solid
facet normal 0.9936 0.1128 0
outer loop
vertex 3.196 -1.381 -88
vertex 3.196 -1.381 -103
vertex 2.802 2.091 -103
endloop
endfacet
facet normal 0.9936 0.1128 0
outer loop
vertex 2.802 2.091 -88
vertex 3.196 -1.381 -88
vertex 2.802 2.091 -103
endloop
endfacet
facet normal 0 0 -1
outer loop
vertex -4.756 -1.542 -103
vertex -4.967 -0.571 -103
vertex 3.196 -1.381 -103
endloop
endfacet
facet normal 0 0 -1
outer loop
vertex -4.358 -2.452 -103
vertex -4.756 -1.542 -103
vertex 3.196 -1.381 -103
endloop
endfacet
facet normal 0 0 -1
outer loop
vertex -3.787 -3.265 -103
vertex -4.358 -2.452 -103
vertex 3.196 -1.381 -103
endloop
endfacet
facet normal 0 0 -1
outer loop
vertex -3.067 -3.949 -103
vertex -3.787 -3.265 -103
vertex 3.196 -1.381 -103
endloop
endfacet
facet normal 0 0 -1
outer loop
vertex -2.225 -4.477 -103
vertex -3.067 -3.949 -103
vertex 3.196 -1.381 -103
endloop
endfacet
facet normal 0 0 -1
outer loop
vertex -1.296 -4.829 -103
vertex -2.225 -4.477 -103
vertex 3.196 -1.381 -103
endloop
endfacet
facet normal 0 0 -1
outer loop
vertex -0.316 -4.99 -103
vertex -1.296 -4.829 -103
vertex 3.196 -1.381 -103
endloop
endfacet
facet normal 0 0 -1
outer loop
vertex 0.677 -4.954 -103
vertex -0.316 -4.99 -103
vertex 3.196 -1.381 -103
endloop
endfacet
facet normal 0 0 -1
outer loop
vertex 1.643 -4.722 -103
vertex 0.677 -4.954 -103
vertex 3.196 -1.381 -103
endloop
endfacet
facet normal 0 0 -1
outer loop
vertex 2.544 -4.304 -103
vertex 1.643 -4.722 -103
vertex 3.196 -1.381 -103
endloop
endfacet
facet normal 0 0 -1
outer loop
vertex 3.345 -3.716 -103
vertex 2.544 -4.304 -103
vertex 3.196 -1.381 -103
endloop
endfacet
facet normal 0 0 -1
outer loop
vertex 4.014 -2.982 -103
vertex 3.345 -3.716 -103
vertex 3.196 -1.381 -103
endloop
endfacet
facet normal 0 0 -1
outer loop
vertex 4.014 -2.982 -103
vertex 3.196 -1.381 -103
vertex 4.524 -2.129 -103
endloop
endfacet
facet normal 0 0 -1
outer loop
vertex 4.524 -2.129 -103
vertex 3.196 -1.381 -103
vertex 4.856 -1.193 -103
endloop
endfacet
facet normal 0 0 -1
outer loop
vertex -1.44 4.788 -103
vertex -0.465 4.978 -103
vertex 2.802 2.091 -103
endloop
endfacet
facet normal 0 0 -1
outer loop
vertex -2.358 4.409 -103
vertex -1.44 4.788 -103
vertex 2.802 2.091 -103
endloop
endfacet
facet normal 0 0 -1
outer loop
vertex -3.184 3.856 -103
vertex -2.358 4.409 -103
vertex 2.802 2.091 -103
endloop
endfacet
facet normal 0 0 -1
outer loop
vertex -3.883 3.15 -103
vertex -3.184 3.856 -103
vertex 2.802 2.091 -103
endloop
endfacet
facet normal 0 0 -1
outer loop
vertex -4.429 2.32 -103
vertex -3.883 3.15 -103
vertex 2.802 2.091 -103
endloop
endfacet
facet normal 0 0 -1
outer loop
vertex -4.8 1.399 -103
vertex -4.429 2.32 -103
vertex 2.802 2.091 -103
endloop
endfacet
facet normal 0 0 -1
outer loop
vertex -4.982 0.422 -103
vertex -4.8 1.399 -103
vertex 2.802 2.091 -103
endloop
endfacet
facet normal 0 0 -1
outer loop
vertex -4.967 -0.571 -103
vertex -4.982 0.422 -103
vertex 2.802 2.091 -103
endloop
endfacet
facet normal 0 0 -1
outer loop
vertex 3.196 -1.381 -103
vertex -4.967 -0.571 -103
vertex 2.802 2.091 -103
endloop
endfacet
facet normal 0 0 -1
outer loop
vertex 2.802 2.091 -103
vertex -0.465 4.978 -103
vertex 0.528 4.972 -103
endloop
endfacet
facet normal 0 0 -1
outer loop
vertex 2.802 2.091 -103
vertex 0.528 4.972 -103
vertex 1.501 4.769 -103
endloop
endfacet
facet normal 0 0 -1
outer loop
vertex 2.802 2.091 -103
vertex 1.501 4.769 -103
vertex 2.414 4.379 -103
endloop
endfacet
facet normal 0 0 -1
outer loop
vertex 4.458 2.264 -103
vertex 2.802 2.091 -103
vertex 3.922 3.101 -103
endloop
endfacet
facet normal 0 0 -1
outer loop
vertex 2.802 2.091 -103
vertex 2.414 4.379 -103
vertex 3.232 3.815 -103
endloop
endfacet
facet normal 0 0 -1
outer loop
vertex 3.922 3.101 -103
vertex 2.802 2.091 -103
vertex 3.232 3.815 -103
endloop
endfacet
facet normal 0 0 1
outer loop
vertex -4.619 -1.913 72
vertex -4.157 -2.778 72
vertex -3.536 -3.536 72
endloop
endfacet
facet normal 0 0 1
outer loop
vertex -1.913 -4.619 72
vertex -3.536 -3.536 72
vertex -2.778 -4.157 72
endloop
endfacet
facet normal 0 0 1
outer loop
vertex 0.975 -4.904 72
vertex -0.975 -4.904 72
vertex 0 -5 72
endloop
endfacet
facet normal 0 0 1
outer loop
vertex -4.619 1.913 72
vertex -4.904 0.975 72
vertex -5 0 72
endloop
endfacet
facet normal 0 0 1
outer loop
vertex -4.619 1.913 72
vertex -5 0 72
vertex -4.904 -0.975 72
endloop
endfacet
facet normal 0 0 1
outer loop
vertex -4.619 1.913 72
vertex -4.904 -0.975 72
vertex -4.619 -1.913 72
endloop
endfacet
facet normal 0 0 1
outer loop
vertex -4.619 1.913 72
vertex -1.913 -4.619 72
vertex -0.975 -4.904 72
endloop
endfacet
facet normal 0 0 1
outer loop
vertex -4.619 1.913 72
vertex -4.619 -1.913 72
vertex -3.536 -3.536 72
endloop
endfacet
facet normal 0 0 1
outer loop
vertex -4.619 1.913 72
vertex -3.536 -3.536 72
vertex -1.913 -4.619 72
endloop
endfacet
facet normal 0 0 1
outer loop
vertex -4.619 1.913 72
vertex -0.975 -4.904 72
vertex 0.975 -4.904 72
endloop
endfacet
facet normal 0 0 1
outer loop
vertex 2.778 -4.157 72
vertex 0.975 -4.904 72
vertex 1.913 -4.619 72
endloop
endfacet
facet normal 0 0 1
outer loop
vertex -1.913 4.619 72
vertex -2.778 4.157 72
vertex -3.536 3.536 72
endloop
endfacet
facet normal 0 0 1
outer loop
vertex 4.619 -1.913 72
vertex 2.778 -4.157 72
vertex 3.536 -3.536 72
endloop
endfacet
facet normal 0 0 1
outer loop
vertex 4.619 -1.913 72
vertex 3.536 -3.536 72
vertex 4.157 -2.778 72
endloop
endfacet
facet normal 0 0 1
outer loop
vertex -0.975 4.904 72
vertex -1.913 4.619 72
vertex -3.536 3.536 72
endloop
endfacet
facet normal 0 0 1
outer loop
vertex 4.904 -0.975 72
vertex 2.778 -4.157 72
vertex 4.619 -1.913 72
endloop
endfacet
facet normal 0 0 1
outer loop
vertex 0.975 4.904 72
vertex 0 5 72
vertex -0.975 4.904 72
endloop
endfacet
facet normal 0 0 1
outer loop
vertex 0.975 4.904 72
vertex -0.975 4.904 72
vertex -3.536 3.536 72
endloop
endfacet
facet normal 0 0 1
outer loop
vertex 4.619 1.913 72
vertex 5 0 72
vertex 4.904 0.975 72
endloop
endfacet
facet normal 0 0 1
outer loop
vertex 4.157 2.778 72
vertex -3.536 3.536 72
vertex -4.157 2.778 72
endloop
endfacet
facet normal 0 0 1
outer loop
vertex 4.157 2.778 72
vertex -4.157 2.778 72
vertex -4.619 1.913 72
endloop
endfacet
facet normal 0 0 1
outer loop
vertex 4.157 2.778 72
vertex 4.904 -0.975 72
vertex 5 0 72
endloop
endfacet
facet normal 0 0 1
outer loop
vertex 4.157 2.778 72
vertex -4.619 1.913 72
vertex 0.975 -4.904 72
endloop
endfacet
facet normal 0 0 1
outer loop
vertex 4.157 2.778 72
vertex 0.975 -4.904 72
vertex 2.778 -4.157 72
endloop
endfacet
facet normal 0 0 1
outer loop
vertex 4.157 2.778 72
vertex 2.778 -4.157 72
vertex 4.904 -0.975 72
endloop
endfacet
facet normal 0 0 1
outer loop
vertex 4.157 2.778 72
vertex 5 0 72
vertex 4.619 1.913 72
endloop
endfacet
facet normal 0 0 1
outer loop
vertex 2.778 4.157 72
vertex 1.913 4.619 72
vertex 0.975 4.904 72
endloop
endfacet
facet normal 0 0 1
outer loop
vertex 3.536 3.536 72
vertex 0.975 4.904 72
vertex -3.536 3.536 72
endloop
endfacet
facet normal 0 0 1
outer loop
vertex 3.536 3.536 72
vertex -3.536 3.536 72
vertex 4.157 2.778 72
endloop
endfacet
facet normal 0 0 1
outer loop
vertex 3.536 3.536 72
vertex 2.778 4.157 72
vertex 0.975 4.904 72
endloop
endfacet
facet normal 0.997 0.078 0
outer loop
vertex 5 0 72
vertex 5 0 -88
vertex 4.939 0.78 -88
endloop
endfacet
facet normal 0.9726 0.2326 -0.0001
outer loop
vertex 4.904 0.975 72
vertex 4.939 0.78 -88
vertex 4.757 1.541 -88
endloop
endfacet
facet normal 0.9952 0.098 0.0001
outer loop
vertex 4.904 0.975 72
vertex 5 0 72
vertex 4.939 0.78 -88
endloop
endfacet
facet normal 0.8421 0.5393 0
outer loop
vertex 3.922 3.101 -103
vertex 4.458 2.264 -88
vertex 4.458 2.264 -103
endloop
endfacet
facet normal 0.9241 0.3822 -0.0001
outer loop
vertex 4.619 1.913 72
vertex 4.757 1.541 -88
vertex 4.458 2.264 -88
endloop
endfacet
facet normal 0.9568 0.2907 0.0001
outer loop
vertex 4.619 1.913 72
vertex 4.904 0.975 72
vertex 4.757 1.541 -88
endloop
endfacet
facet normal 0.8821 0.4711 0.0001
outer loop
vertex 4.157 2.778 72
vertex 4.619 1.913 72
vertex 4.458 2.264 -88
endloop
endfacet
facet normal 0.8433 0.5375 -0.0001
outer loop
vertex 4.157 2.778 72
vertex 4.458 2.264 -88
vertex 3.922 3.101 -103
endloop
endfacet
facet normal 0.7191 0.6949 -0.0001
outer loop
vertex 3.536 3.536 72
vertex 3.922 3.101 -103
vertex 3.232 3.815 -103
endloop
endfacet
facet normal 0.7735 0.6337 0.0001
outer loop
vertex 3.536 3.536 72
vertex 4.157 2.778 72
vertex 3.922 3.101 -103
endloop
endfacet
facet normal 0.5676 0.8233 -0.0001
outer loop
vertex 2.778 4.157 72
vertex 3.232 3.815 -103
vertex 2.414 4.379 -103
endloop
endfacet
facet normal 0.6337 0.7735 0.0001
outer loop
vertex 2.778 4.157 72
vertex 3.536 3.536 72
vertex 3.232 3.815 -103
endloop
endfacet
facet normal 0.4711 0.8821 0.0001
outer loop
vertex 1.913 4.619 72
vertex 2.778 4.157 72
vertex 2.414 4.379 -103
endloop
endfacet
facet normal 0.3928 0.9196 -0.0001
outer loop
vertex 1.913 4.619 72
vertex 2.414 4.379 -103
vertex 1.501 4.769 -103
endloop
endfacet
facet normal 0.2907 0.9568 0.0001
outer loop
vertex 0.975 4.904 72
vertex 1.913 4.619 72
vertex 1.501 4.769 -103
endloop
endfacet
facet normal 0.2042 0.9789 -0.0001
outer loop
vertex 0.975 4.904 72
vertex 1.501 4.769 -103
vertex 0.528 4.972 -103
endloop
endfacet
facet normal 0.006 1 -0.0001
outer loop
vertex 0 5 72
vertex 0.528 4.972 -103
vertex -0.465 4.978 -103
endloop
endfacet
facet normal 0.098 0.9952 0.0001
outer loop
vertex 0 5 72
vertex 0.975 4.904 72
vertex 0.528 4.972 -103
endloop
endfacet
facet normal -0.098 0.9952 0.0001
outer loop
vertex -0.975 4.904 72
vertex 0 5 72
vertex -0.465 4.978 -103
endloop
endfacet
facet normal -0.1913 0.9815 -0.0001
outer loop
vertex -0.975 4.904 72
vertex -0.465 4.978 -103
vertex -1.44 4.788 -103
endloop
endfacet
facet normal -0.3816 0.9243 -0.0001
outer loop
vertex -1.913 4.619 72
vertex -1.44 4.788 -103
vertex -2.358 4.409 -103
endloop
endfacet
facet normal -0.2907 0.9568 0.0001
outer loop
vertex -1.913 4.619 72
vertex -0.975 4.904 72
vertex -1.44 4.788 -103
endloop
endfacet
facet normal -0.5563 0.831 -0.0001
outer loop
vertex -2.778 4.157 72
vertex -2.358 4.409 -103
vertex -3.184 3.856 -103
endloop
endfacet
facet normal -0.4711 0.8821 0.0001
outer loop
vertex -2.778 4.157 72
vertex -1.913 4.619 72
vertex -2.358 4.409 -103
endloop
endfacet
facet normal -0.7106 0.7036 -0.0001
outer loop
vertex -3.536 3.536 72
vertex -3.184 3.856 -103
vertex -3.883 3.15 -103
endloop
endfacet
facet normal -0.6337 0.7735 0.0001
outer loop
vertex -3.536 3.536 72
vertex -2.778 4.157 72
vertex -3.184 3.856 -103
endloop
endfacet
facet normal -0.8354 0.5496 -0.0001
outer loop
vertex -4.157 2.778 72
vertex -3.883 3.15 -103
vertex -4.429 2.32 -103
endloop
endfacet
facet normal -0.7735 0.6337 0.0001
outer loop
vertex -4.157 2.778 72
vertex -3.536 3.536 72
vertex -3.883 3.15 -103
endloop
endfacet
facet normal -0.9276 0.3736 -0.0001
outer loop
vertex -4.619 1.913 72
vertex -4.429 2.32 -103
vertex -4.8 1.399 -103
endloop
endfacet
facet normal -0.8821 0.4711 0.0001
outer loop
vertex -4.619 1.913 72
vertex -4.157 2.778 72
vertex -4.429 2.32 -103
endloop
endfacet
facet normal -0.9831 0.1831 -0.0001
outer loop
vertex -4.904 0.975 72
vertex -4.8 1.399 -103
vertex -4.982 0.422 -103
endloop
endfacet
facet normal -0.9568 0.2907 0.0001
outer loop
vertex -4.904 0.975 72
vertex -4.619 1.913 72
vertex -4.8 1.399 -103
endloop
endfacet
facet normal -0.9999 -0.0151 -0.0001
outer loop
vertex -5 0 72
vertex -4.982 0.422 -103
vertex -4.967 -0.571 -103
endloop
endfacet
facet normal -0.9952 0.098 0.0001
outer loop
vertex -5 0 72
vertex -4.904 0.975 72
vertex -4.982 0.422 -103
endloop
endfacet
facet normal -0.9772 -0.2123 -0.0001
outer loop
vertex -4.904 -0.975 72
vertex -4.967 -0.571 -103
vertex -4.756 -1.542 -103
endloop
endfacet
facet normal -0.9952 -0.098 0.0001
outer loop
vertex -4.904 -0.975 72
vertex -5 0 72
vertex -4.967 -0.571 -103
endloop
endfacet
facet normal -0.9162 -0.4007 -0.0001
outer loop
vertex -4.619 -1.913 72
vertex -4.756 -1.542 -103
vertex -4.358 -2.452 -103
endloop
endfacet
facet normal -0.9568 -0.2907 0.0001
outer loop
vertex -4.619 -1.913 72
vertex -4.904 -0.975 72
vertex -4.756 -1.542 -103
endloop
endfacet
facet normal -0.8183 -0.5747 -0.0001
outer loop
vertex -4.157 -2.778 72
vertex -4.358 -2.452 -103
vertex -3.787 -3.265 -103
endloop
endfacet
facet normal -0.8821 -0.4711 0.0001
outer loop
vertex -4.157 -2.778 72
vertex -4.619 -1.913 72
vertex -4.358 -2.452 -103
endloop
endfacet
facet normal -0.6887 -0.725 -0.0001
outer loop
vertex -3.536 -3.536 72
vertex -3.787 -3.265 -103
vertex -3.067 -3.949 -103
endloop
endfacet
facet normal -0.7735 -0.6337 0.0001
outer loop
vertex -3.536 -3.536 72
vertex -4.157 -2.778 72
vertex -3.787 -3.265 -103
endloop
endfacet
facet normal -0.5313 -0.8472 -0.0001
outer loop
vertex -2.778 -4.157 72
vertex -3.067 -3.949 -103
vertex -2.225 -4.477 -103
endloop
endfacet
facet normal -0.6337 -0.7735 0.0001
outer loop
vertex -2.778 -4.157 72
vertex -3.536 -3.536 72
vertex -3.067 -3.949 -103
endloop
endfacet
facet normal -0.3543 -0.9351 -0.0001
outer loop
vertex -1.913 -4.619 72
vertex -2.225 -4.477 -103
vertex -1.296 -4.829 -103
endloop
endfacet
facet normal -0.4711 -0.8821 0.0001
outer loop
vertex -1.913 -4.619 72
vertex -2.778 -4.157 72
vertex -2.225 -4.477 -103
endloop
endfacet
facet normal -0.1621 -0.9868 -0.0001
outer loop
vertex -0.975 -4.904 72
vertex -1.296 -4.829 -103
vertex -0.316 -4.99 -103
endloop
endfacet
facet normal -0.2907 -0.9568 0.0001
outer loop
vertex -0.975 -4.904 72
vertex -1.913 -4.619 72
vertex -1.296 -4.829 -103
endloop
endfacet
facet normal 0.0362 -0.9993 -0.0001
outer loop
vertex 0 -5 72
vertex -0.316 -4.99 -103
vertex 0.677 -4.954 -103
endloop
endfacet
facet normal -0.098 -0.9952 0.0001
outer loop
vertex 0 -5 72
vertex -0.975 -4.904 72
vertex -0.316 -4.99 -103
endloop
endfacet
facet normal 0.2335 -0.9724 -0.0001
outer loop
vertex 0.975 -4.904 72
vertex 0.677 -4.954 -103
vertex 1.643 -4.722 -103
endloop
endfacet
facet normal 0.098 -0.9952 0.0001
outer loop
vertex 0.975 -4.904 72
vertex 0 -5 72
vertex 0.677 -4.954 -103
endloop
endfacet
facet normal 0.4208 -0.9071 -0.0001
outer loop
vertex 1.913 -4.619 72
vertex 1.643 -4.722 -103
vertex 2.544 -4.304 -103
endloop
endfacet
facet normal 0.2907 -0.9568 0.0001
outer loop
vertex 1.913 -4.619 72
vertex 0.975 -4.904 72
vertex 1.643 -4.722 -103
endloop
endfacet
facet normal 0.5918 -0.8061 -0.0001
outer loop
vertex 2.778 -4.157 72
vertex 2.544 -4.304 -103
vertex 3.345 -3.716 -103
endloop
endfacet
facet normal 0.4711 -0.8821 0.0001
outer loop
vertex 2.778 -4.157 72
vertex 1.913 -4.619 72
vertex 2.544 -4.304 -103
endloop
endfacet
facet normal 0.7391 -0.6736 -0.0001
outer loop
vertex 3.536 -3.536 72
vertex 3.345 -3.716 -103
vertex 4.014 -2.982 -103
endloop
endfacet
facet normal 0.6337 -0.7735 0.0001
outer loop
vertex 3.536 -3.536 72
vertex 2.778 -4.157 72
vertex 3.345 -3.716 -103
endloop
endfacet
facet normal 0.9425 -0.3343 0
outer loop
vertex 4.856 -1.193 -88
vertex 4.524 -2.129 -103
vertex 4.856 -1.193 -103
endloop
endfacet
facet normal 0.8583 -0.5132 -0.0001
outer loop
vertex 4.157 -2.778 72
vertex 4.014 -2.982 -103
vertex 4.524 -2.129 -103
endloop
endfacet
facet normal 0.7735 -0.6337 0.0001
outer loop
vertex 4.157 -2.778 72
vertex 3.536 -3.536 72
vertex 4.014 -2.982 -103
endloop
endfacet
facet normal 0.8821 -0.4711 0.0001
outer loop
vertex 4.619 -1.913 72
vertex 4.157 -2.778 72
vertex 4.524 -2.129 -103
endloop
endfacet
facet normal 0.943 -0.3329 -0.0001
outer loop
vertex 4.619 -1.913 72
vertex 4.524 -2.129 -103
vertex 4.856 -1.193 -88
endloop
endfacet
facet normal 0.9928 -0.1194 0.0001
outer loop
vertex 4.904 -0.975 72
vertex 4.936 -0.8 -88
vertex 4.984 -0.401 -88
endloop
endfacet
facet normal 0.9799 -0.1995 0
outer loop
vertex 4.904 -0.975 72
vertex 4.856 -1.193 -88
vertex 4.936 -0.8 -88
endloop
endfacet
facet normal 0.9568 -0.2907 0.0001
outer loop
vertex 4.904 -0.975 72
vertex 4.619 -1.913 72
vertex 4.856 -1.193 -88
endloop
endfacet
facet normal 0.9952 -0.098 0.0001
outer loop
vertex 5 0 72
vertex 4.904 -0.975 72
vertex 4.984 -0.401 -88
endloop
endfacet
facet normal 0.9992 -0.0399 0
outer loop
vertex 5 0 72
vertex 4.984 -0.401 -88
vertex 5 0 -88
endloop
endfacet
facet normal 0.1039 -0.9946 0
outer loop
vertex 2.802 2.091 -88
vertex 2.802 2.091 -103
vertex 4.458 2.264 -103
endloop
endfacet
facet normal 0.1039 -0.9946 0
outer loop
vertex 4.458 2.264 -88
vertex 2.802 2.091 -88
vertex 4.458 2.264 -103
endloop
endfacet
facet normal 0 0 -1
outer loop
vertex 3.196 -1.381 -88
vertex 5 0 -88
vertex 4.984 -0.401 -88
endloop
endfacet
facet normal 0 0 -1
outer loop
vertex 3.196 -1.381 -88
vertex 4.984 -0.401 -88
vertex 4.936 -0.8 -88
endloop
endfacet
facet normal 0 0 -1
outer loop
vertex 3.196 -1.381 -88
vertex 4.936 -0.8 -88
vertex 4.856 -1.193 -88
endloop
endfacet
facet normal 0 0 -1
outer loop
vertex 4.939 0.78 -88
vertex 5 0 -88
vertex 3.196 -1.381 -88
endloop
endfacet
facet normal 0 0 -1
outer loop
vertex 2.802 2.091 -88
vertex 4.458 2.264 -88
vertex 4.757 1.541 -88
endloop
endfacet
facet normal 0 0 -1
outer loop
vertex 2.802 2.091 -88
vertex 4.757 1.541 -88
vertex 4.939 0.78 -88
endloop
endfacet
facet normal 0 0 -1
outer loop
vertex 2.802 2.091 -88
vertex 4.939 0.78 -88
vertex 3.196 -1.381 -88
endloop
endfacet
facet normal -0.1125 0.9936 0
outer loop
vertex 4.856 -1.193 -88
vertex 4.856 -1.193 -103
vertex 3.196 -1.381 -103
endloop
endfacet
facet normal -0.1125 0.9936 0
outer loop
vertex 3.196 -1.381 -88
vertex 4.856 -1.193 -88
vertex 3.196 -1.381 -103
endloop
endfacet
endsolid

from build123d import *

# Parameters (mm, degrees)
SKETCH1_R                = 5
BOSS_EXTRUDE1_DEPTH      = 72
BOSS_EXTRUDE1_DEPTH_BACK = 103
CUT_EXTRUDE1_DEPTH       = 15


with BuildPart() as part:
    # Sketch1 → Boss-Extrude1 (new body, two sides)
    with BuildSketch(Plane.XY) as boss_extrude1_sk:
        Circle(SKETCH1_R)
    extrude(amount=BOSS_EXTRUDE1_DEPTH)
    extrude(boss_extrude1_sk.sketch, amount=-BOSS_EXTRUDE1_DEPTH_BACK)

    # Sketch2 → Cut-Extrude1 (cut)
    with BuildSketch(Plane(origin=(0, 0, -103), x_dir=(-1, 0, 0), z_dir=(0, 0, -1))):
        with BuildLine():
            Line((-4.855567152, -1.193091626), (-3.196182545, -1.381362864))
            Line((-3.196182545, -1.381362864), (-2.802213635, 2.090999416))
            Line((-2.802213635, 2.090999416), (-4.458066071, 2.263989158))
            ThreePointArc((-4.458066071, 2.263989158), (-4.967272173, 0.571145479), (-4.855567152, -1.193091626))
        make_face()
    extrude(amount=-CUT_EXTRUDE1_DEPTH, mode=Mode.SUBTRACT)


solid = part.part
